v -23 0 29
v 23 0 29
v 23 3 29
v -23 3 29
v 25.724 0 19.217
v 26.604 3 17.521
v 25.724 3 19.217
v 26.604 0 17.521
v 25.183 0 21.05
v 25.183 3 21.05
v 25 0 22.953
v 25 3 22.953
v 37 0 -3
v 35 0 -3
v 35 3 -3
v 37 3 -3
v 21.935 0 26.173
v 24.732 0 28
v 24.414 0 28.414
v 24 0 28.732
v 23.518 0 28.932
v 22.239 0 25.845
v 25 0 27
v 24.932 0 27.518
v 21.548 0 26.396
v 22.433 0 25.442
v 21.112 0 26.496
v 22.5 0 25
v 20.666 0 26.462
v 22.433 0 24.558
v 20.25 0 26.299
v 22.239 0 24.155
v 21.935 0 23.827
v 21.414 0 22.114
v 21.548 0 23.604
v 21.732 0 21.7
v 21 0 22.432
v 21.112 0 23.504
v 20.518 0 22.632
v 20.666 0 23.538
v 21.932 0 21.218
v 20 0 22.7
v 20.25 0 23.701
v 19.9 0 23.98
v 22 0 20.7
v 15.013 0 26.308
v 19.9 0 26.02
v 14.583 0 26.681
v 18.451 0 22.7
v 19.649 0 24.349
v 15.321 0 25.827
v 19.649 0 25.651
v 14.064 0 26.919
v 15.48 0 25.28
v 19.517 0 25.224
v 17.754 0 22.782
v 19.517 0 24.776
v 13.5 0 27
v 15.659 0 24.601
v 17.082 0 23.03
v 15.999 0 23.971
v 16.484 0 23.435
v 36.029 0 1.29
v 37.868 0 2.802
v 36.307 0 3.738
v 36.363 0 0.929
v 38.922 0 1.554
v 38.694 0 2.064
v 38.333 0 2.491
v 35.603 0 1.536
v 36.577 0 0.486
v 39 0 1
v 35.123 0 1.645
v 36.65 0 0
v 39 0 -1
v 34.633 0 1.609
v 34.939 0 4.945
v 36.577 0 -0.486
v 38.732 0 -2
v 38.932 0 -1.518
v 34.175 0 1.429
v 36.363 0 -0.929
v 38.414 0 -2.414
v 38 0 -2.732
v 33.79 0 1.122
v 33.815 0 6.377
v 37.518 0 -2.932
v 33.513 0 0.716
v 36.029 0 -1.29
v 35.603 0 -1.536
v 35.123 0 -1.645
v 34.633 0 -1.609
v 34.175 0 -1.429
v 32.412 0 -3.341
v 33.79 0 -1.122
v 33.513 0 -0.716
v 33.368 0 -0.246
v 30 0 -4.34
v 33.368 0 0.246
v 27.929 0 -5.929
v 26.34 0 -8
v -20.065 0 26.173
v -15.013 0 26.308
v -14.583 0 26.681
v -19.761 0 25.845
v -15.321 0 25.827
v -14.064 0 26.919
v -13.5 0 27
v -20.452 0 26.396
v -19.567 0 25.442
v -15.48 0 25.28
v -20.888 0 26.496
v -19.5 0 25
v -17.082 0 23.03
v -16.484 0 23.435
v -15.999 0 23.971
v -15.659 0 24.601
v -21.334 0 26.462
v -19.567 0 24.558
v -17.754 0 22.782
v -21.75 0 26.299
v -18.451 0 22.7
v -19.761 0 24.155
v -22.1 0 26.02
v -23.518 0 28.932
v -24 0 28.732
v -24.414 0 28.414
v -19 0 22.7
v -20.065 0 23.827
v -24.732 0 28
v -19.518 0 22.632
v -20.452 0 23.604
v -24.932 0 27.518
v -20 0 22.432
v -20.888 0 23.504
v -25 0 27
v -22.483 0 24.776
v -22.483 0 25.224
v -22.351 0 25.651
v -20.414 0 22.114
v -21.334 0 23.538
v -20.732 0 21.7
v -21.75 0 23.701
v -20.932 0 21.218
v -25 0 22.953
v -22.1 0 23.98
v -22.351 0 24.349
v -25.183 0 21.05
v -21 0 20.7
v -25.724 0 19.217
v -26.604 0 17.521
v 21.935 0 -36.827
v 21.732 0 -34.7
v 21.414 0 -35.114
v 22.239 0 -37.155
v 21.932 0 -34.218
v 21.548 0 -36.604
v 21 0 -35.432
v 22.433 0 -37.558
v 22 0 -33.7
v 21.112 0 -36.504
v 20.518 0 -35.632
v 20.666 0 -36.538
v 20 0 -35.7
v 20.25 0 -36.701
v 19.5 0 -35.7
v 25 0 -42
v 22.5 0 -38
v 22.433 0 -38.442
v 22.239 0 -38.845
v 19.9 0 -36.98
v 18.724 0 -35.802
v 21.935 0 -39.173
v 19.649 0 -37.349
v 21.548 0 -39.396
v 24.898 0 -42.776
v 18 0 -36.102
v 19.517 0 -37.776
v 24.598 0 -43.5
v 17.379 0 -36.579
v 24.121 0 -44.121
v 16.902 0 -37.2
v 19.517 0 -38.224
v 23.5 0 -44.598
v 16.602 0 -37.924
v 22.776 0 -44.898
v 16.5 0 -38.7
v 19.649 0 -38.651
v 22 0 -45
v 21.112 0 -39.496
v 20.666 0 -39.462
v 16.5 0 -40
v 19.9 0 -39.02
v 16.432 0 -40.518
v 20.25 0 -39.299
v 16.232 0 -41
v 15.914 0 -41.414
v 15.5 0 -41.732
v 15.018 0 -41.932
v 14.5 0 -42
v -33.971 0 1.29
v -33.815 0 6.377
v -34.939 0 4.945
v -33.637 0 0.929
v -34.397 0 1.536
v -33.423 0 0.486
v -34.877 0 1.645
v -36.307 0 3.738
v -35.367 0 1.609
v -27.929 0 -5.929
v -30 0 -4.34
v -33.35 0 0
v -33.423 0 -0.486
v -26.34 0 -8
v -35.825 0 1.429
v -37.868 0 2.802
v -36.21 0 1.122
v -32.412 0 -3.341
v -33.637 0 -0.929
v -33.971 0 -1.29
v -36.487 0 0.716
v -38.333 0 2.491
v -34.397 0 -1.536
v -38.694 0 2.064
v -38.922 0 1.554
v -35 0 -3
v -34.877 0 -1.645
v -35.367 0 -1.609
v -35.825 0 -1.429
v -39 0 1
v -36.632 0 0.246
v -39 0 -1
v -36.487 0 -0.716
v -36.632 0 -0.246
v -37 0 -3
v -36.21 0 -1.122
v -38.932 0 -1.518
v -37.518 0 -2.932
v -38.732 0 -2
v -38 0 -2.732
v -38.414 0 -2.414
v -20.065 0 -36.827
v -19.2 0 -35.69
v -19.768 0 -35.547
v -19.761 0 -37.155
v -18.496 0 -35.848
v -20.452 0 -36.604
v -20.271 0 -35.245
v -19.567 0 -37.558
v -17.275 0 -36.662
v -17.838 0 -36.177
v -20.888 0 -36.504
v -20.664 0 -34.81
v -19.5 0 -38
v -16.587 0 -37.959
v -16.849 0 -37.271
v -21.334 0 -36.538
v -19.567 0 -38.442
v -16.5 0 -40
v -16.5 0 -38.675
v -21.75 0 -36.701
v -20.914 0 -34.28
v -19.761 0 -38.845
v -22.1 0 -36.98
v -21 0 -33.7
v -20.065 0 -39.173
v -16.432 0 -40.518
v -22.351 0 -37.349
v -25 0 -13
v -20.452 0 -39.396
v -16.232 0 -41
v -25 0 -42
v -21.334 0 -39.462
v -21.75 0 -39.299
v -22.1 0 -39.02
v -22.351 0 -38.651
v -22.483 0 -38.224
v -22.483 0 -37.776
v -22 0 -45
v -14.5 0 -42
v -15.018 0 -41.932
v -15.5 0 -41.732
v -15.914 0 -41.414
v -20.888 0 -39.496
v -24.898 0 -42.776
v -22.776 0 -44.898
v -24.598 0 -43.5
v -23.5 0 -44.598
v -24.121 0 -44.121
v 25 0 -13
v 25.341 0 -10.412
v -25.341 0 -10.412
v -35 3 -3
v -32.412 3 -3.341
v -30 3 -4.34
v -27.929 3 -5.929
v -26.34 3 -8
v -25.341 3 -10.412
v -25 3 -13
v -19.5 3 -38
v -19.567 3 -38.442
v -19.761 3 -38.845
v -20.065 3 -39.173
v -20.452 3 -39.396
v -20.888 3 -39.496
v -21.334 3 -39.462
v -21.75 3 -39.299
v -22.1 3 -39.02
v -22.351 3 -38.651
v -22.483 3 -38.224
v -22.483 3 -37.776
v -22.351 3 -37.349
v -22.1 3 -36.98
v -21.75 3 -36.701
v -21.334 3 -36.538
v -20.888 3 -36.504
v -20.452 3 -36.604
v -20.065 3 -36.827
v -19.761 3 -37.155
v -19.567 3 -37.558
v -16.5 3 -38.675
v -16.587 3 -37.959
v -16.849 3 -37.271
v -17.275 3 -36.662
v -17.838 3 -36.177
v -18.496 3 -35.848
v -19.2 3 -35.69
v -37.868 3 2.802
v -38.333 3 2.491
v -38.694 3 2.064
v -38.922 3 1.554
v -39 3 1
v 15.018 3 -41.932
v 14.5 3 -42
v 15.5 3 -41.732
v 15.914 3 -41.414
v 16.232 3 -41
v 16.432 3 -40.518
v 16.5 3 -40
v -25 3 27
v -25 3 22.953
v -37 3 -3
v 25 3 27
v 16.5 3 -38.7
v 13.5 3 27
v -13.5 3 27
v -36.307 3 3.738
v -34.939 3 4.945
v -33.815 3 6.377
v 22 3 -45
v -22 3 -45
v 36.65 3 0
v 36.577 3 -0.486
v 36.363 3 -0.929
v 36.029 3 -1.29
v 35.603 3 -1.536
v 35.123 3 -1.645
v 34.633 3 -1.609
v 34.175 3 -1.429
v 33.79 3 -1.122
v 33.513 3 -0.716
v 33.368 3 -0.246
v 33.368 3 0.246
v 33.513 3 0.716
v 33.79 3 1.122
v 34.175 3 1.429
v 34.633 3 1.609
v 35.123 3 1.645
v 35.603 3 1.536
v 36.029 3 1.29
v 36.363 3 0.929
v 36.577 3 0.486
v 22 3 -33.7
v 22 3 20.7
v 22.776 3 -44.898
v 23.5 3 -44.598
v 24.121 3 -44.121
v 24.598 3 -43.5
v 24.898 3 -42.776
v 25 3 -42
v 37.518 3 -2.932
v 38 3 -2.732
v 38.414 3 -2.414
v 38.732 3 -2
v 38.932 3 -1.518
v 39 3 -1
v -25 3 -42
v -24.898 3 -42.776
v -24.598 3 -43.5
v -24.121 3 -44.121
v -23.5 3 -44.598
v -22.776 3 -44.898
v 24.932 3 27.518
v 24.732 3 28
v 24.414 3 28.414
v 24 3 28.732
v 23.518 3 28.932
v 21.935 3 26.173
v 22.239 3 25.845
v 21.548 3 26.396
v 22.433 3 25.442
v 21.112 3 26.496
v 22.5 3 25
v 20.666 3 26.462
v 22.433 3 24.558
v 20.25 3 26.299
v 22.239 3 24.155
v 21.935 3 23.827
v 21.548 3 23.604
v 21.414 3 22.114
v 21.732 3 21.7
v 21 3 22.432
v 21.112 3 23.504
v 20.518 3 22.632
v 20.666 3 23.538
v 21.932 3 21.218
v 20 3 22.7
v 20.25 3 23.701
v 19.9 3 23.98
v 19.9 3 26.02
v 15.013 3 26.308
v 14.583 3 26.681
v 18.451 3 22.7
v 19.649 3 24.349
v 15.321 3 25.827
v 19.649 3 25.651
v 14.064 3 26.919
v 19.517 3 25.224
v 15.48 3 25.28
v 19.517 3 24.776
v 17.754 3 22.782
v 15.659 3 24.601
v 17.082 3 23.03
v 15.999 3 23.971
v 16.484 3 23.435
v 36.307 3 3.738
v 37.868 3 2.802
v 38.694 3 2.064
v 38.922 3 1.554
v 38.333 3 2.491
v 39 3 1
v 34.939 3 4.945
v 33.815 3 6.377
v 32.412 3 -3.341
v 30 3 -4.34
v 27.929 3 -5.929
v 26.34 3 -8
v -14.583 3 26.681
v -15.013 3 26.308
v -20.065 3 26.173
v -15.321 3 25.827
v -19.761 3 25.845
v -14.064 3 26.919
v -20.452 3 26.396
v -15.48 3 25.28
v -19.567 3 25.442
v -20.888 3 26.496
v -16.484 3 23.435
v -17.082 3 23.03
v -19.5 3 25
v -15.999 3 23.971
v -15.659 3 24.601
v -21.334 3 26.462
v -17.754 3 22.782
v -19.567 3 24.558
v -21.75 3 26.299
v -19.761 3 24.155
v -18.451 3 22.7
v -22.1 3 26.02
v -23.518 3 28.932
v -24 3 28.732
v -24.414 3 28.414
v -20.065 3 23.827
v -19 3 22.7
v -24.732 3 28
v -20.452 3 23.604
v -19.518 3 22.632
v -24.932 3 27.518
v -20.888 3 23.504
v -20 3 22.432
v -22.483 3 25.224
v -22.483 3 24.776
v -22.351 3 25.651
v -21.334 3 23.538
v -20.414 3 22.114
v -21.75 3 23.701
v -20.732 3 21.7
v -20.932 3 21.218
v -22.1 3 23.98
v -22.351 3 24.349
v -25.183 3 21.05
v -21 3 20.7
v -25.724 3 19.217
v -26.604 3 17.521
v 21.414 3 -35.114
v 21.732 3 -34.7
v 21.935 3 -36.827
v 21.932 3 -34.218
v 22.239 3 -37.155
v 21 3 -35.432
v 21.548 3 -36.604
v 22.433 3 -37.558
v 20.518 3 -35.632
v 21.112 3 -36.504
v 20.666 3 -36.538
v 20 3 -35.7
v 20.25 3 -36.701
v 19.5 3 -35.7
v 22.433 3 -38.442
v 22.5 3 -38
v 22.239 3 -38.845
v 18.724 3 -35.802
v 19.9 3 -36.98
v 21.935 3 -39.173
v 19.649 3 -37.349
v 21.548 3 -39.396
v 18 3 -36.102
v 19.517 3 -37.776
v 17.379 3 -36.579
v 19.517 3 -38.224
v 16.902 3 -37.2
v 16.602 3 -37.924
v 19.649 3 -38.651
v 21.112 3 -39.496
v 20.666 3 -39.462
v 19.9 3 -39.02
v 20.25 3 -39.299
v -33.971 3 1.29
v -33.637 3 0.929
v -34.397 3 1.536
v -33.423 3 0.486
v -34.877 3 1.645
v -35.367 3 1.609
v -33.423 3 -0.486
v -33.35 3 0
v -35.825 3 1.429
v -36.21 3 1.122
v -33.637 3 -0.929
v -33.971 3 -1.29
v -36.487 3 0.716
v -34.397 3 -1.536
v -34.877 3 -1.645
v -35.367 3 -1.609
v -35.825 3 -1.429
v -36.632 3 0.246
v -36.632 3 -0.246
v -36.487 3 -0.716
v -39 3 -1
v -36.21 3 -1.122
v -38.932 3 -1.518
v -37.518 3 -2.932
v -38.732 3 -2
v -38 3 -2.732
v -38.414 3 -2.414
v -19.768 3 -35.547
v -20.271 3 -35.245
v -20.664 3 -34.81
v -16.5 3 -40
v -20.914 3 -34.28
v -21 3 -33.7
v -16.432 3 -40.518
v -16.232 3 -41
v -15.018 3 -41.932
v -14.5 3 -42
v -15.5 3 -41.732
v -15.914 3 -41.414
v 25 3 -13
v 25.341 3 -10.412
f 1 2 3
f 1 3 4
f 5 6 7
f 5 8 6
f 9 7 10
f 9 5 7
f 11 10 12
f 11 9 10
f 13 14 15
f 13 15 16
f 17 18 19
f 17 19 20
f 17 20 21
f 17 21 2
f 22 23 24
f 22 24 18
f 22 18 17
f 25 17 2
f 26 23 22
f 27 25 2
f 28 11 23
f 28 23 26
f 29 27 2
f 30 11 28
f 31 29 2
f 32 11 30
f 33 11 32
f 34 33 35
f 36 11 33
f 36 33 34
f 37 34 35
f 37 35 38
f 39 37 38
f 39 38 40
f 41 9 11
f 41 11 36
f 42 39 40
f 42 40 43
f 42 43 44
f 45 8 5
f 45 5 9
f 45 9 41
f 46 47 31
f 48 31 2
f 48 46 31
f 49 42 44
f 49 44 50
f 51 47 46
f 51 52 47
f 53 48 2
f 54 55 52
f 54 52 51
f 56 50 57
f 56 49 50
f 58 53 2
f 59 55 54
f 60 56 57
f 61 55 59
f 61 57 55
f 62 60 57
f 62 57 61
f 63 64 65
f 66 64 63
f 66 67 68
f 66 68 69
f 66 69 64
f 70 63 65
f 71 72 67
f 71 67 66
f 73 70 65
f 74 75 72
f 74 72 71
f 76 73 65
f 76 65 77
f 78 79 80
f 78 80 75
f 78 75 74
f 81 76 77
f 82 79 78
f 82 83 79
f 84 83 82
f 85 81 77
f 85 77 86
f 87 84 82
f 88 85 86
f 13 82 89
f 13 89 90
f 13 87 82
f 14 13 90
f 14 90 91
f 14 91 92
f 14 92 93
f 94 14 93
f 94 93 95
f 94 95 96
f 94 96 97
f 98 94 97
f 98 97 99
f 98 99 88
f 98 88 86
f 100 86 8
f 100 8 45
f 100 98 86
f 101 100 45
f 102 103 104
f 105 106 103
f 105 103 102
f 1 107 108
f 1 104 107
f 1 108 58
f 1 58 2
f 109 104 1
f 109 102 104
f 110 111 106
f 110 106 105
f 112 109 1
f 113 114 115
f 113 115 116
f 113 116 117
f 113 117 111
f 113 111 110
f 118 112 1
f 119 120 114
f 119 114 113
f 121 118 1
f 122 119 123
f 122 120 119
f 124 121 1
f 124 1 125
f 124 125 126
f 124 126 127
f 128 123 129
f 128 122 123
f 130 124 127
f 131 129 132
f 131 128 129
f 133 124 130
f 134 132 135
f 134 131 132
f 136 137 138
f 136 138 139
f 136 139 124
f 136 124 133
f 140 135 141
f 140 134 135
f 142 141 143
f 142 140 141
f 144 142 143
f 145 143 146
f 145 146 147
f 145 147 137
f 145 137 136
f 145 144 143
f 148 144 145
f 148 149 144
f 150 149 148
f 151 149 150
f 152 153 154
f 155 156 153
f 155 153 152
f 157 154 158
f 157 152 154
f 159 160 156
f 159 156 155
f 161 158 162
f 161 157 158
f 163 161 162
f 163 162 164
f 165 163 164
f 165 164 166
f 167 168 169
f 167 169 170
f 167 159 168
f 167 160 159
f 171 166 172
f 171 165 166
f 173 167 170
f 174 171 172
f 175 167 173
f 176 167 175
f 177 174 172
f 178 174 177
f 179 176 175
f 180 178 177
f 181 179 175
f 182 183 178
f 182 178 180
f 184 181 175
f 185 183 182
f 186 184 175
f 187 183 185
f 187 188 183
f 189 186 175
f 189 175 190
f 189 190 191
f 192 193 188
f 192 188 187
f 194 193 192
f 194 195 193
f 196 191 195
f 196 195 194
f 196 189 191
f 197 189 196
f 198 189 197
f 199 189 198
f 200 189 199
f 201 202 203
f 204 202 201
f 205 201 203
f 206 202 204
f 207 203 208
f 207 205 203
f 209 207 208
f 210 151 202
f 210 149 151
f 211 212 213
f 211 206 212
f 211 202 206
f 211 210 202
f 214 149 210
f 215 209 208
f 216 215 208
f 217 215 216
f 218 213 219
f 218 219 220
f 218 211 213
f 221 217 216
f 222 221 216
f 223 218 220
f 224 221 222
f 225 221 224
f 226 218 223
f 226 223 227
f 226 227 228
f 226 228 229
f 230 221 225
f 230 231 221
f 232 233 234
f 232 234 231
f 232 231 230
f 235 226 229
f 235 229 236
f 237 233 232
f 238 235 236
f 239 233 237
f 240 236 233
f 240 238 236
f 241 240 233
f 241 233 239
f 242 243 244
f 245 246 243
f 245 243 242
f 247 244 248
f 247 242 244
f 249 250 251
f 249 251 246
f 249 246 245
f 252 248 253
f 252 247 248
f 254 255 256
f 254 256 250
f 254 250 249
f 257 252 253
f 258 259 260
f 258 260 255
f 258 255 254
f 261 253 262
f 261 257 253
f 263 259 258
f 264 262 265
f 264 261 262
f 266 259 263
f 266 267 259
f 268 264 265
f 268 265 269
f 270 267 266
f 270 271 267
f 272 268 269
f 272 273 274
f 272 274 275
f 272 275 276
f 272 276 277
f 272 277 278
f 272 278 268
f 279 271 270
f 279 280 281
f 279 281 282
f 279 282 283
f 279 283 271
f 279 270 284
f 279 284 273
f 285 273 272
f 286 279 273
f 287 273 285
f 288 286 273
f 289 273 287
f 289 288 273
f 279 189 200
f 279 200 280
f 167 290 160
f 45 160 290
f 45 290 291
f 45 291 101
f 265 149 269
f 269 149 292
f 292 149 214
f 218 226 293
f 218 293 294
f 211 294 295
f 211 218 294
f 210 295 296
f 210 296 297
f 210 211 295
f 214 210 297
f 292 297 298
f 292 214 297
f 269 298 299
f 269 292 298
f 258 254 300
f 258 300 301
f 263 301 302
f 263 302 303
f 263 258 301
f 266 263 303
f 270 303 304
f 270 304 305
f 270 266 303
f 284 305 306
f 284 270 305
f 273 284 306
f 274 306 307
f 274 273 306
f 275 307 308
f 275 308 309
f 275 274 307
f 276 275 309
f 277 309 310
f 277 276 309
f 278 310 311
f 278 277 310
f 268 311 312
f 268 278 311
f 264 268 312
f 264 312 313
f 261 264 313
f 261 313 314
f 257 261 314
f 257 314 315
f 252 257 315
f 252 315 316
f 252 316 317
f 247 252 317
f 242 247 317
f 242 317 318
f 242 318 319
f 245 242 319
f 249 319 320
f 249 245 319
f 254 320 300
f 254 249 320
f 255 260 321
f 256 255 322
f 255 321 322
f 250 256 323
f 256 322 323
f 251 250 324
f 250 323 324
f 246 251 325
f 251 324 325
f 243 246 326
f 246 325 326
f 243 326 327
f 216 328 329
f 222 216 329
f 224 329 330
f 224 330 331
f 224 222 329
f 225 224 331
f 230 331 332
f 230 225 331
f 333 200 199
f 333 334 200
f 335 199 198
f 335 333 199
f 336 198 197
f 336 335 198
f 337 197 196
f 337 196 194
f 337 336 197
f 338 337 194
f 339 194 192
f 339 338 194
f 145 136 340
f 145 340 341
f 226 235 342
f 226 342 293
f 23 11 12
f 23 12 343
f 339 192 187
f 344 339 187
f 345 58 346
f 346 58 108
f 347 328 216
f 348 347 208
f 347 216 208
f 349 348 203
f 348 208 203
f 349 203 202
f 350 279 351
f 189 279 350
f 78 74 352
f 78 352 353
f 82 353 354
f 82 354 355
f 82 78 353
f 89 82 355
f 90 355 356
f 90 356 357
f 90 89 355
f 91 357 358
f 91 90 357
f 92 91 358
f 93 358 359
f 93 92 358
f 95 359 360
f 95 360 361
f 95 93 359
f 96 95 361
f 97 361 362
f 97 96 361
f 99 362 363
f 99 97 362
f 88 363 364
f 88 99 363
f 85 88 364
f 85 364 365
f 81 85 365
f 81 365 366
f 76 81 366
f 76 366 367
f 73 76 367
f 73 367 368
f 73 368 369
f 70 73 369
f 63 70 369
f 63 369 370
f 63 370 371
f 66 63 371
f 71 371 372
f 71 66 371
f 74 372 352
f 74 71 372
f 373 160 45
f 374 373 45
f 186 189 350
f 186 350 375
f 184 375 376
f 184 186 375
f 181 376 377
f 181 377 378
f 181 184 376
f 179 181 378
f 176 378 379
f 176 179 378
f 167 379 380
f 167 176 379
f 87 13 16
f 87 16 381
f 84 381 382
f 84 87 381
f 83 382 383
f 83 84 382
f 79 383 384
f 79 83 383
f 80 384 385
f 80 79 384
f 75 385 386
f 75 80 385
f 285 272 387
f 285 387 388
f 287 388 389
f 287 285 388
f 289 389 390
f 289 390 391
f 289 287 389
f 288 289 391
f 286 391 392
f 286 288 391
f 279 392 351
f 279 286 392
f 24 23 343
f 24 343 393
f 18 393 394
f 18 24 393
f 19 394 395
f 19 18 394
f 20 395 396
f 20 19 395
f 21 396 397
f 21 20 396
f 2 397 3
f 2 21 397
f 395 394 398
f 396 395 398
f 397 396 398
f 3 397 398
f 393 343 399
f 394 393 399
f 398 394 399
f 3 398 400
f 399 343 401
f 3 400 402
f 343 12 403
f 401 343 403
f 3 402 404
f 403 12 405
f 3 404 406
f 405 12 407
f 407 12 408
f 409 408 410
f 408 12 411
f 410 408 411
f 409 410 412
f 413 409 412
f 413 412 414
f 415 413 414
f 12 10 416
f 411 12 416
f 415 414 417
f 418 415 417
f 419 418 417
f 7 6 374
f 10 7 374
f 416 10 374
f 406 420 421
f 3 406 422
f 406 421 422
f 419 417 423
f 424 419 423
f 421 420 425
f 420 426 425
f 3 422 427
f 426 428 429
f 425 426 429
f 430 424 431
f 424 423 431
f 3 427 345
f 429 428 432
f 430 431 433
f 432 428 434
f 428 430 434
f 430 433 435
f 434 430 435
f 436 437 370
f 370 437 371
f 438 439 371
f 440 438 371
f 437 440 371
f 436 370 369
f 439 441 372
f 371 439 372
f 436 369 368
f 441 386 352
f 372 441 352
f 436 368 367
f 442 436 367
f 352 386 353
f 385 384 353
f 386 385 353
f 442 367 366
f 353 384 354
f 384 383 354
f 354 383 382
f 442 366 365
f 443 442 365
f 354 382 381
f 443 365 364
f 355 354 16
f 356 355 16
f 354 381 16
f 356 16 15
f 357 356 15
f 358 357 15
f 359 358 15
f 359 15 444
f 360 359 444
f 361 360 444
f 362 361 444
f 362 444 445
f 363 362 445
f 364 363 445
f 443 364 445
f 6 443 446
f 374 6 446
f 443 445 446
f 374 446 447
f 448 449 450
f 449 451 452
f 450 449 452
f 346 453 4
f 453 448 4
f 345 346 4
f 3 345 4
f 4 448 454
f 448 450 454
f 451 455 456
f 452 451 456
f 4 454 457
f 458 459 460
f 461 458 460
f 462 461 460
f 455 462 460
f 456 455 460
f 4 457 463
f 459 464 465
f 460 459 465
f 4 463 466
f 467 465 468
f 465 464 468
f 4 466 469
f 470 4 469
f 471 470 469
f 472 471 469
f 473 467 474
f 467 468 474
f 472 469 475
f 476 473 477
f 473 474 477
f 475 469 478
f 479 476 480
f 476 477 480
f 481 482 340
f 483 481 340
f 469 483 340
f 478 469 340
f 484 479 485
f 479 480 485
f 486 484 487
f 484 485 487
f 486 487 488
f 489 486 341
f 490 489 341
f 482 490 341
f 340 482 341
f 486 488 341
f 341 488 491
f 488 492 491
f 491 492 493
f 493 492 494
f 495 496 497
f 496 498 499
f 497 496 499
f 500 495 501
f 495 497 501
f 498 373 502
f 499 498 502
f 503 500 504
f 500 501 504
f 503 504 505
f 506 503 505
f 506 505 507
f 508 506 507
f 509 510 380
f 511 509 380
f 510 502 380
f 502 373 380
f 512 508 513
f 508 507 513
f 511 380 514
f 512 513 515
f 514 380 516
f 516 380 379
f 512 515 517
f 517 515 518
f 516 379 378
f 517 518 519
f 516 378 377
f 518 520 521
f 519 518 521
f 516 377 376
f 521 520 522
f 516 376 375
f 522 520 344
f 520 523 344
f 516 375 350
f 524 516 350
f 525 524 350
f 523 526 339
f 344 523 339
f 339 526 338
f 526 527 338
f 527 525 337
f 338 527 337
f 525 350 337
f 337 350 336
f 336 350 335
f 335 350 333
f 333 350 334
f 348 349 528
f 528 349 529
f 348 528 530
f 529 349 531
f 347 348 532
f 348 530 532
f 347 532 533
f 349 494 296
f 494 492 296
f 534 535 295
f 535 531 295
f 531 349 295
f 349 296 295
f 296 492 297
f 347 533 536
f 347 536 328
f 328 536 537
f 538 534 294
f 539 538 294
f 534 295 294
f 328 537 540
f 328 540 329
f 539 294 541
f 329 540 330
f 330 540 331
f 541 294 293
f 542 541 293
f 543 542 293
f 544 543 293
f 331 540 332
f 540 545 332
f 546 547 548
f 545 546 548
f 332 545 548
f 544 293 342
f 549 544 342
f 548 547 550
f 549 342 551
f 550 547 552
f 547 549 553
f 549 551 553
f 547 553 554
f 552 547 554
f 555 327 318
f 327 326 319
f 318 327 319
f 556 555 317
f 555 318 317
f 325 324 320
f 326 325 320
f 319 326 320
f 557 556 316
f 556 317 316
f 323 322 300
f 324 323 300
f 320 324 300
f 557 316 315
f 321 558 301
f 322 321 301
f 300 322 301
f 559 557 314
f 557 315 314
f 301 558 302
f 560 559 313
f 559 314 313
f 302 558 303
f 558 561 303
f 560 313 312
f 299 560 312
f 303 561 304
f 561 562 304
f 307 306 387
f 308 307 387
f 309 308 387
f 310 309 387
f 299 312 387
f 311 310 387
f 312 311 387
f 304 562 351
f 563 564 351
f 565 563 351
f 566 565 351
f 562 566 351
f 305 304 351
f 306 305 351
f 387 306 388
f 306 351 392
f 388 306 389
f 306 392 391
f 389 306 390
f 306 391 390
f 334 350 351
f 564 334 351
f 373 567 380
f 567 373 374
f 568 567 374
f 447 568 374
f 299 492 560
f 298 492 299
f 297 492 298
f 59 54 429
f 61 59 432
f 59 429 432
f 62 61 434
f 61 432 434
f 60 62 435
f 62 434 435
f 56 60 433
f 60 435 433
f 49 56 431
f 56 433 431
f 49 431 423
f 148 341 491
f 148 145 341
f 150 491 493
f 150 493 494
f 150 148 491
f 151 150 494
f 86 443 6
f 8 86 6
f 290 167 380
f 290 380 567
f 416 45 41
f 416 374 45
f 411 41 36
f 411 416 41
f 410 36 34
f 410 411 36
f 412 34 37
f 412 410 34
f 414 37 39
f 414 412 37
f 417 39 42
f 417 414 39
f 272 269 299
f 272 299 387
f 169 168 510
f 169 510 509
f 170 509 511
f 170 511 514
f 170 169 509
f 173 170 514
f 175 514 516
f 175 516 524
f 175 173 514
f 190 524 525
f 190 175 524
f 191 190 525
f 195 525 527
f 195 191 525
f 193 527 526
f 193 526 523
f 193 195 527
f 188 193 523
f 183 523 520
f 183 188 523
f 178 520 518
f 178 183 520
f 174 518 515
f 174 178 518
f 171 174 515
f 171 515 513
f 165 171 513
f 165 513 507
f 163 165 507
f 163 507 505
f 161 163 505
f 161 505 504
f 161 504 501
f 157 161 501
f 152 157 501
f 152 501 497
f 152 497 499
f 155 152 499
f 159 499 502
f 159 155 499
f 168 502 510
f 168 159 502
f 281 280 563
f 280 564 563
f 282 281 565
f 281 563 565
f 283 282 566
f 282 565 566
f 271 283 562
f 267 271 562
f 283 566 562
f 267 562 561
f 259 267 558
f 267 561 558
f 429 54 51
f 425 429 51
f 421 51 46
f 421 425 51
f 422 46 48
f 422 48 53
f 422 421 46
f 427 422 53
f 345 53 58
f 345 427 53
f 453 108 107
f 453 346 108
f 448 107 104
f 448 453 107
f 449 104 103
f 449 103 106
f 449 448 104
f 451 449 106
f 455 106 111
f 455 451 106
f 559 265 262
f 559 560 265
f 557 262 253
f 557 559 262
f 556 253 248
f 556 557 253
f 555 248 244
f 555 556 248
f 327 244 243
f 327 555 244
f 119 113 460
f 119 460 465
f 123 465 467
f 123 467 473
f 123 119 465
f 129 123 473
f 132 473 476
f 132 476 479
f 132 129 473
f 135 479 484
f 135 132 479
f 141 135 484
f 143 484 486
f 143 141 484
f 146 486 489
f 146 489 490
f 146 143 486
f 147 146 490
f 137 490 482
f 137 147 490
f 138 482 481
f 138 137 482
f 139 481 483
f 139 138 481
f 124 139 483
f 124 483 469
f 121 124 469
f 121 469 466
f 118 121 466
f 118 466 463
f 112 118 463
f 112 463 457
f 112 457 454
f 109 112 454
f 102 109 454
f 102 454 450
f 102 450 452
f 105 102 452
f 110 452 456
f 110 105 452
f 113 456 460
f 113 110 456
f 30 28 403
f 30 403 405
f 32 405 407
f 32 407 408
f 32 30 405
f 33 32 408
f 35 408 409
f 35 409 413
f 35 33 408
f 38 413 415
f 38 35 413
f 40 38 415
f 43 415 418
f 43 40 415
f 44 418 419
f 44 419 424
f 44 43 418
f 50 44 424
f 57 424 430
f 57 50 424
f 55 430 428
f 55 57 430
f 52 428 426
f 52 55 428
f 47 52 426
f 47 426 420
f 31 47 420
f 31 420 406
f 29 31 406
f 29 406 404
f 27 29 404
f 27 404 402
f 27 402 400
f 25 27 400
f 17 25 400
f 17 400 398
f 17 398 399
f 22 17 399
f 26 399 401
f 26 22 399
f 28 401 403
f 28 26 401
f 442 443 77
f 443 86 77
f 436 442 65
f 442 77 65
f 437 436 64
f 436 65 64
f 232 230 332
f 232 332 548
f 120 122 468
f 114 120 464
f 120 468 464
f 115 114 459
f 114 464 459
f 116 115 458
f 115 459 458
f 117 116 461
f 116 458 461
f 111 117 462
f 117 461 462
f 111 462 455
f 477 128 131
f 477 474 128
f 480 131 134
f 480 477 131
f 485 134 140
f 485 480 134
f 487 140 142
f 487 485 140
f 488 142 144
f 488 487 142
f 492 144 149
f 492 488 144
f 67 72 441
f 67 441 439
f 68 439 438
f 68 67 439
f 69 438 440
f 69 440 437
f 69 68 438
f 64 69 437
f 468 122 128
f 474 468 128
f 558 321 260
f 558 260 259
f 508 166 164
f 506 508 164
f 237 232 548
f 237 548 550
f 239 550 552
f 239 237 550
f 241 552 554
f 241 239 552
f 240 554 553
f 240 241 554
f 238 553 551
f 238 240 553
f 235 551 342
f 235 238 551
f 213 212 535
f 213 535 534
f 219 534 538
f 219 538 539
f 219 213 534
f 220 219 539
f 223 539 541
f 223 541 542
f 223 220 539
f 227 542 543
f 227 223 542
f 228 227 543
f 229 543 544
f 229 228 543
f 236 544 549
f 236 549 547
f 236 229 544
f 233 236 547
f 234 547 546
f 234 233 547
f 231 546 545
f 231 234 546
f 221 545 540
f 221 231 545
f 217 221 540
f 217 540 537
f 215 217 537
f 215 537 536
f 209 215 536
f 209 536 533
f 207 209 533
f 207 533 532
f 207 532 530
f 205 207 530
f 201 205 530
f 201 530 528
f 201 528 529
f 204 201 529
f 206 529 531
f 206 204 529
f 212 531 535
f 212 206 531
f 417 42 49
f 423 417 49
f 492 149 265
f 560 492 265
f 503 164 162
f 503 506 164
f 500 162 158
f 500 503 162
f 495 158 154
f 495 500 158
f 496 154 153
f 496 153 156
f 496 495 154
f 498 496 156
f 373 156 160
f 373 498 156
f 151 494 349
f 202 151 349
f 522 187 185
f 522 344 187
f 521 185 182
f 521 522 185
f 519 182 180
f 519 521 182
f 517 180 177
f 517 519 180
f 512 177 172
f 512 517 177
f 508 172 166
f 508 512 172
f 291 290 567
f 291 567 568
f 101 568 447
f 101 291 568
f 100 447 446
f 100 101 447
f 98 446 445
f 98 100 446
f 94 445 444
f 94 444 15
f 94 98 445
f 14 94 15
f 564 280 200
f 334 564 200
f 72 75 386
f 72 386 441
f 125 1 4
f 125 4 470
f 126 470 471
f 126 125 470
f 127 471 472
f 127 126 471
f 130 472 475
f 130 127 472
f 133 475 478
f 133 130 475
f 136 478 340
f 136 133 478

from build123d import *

# Parameters (mm, degrees)
SKETCH_1_R          = 1.65
SKETCH_1_R_2        = 1.5
EXTRUDE_1_DEPTH     = 3
FILLET_1_R          = 2
EXTRUDE_2_DEPTH     = 3
FILLET_2_R          = 10
SKETCH_3_W          = 43
SKETCH_3_H          = 4
EXTRUDE_3_DEPTH     = 3
FILLET_3_R          = 5
SKETCH_4_W          = 43
SKETCH_4_H          = 19.849699933
CUT_EXTRUDE_1_DEPTH = 10
FILLET_4_R          = 3
FILLET_5_R          = 3
FILLET_6_R          = 3
FILLET_7_R          = 3


with BuildPart() as part:
    # 草图1 → 凸台-拉伸1 (new body)
    with BuildSketch(Plane(origin=(0, 0, 0), x_dir=(1, 0, 0), z_dir=(0, 1, 0))):
        with BuildLine():
            Line((-37, 3), (-35, 3))
            ThreePointArc((-35, 3), (-27.928932188, 5.928932188), (-25, 13))
            Line((-25, 13), (-25, 42))
            ThreePointArc((-25, 42), (-24.121320344, 44.121320344), (-22, 45))
            Line((-22, 45), (22, 45))
            ThreePointArc((22, 45), (24.121320344, 44.121320344), (25, 42))
            Line((25, 42), (25, 13))
            ThreePointArc((25, 13), (27.928932188, 5.928932188), (35, 3))
            Line((35, 3), (37, 3))
            ThreePointArc((37, 3), (38.414213562, 2.414213562), (39, 1))
            Line((39, 1), (39, -1))
            ThreePointArc((39, -1), (38.414213562, -2.414213562), (37, -3))
            Line((37, -3), (35, -3))
            ThreePointArc((35, -3), (27.928932188, -5.928932188), (25, -13))
            Line((25, -13), (25, -27))
            ThreePointArc((25, -27), (24.414213562, -28.414213562), (23, -29))
            Line((23, -29), (-0.329591816, -29))
            Line((-0.329591816, -29), (-23, -29))
            ThreePointArc((-23, -29), (-24.414213562, -28.414213562), (-25, -27))
            Line((-25, -27), (-25, -13))
            ThreePointArc((-25, -13), (-27.928932188, -5.928932188), (-35, -3))
            Line((-35, -3), (-37, -3))
            ThreePointArc((-37, -3), (-38.414213562, -2.414213562), (-39, -1))
            Line((-39, -1), (-39, 1))
            ThreePointArc((-39, 1), (-38.414213562, 2.414213562), (-37, 3))
        make_face()
        with Locations((35, 0)):
            Circle(SKETCH_1_R, mode=Mode.SUBTRACT)
        with Locations((-35, 0)):
            Circle(SKETCH_1_R, mode=Mode.SUBTRACT)
        with Locations((21, 38)):
            Circle(SKETCH_1_R_2, mode=Mode.SUBTRACT)
        with Locations((21, -25)):
            Circle(SKETCH_1_R_2, mode=Mode.SUBTRACT)
        with Locations((-21, 38)):
            Circle(SKETCH_1_R_2, mode=Mode.SUBTRACT)
        with Locations((-21, -25)):
            Circle(SKETCH_1_R_2, mode=Mode.SUBTRACT)
        Polygon((-16.5, 42), (16.5, 42), (16.5, 35.7), (22, 35.7), (22, -22.7), (15.5, -22.7), (15.5, -27), (-15.5, -27), (-15.5, -22.7), (-21, -22.7), (-21, 35.7), (-16.5, 35.7), align=None, mode=Mode.SUBTRACT)
    extrude(amount=EXTRUDE_1_DEPTH)

    # 圆角1
    fillet_1_edges = [part.edges().sort_by_distance(p)[0] for p in [
        (-16.5, 1.5, -42),
        (-21, 1.5, -35.7),
        (-21, 1.5, 22.7),
        (-15.5, 1.5, 27),
        (15.5, 1.5, 27),
        (22, 1.5, 22.7),
        (22, 1.5, -35.7),
        (16.5, 1.5, -42),
    ]]
    fillet(fillet_1_edges, radius=FILLET_1_R)

    # 草图2 → 凸台-拉伸2 (add)
    with BuildSketch(Plane(origin=(0, 3, 0), x_dir=(1, 0, 0), z_dir=(0, 1, 0))):
        with BuildLine():
            Line((36, -3), (25, -20))
            Line((25, -20), (25, -13))
            ThreePointArc((25, -13), (27.928932188, -5.928932188), (35, -3))
            Line((35, -3), (36, -3))
        make_face()
        with BuildLine():
            Line((-25, -13), (-25, -20))
            Line((-25, -20), (-36, -3))
            Line((-36, -3), (-35, -3))
            ThreePointArc((-35, -3), (-27.928932188, -5.928932188), (-25, -13))
        make_face()
    extrude(amount=-EXTRUDE_2_DEPTH)

    # 圆角2
    fillet_2_edges = [part.edges().sort_by_distance(p)[0] for p in [
        (36, 1.5, 3),
        (25, 1.5, 20),
        (-36, 1.5, 3),
        (-25, 1.5, 20),
    ]]
    fillet(fillet_2_edges, radius=FILLET_2_R)

    # 草图3 → 凸台-拉伸3 (add)
    with BuildSketch(Plane(origin=(0, 3, 0), x_dir=(1, 0, 0), z_dir=(0, 1, 0))):
        with Locations((0.5, 8.5)):
            Rectangle(SKETCH_3_W, SKETCH_3_H)
    extrude(amount=-EXTRUDE_3_DEPTH)

    # 圆角3
    fillet_3_edges = [part.edges().sort_by_distance(p)[0] for p in [
        (-21, 1.5, -6.5),
        (22, 1.5, -6.5),
        (22, 1.5, -10.5),
        (-21, 1.5, -10.5),
    ]]
    fillet(fillet_3_edges, radius=FILLET_3_R)

    # 草图4 → 切除-拉伸1 (cut)
    with BuildSketch(Plane(origin=(0, 3, 0), x_dir=(1, 0, 0), z_dir=(0, 1, 0))):
        with Locations((0.5, 9.924849967)):
            Rectangle(SKETCH_4_W, SKETCH_4_H)
    extrude(amount=-CUT_EXTRUDE_1_DEPTH, mode=Mode.SUBTRACT)

    # 圆角4
    fillet_4_edges = [part.edges().sort_by_distance(p)[0] for p in [
        (16.5, 1.5, -35.7),
    ]]
    fillet(fillet_4_edges, radius=FILLET_4_R)

    # 圆角5
    fillet_5_edges = [part.edges().sort_by_distance(p)[0] for p in [
        (-16.5, 1.5, -35.7),
    ]]
    fillet(fillet_5_edges, radius=FILLET_5_R)

    # 圆角6
    fillet_6_edges = [part.edges().sort_by_distance(p)[0] for p in [
        (-15.5, 1.5, 22.7),
    ]]
    fillet(fillet_6_edges, radius=FILLET_6_R)

    # 圆角7
    fillet_7_edges = [part.edges().sort_by_distance(p)[0] for p in [
        (15.5, 1.5, 22.7),
    ]]
    fillet(fillet_7_edges, radius=FILLET_7_R)


solid = part.part
